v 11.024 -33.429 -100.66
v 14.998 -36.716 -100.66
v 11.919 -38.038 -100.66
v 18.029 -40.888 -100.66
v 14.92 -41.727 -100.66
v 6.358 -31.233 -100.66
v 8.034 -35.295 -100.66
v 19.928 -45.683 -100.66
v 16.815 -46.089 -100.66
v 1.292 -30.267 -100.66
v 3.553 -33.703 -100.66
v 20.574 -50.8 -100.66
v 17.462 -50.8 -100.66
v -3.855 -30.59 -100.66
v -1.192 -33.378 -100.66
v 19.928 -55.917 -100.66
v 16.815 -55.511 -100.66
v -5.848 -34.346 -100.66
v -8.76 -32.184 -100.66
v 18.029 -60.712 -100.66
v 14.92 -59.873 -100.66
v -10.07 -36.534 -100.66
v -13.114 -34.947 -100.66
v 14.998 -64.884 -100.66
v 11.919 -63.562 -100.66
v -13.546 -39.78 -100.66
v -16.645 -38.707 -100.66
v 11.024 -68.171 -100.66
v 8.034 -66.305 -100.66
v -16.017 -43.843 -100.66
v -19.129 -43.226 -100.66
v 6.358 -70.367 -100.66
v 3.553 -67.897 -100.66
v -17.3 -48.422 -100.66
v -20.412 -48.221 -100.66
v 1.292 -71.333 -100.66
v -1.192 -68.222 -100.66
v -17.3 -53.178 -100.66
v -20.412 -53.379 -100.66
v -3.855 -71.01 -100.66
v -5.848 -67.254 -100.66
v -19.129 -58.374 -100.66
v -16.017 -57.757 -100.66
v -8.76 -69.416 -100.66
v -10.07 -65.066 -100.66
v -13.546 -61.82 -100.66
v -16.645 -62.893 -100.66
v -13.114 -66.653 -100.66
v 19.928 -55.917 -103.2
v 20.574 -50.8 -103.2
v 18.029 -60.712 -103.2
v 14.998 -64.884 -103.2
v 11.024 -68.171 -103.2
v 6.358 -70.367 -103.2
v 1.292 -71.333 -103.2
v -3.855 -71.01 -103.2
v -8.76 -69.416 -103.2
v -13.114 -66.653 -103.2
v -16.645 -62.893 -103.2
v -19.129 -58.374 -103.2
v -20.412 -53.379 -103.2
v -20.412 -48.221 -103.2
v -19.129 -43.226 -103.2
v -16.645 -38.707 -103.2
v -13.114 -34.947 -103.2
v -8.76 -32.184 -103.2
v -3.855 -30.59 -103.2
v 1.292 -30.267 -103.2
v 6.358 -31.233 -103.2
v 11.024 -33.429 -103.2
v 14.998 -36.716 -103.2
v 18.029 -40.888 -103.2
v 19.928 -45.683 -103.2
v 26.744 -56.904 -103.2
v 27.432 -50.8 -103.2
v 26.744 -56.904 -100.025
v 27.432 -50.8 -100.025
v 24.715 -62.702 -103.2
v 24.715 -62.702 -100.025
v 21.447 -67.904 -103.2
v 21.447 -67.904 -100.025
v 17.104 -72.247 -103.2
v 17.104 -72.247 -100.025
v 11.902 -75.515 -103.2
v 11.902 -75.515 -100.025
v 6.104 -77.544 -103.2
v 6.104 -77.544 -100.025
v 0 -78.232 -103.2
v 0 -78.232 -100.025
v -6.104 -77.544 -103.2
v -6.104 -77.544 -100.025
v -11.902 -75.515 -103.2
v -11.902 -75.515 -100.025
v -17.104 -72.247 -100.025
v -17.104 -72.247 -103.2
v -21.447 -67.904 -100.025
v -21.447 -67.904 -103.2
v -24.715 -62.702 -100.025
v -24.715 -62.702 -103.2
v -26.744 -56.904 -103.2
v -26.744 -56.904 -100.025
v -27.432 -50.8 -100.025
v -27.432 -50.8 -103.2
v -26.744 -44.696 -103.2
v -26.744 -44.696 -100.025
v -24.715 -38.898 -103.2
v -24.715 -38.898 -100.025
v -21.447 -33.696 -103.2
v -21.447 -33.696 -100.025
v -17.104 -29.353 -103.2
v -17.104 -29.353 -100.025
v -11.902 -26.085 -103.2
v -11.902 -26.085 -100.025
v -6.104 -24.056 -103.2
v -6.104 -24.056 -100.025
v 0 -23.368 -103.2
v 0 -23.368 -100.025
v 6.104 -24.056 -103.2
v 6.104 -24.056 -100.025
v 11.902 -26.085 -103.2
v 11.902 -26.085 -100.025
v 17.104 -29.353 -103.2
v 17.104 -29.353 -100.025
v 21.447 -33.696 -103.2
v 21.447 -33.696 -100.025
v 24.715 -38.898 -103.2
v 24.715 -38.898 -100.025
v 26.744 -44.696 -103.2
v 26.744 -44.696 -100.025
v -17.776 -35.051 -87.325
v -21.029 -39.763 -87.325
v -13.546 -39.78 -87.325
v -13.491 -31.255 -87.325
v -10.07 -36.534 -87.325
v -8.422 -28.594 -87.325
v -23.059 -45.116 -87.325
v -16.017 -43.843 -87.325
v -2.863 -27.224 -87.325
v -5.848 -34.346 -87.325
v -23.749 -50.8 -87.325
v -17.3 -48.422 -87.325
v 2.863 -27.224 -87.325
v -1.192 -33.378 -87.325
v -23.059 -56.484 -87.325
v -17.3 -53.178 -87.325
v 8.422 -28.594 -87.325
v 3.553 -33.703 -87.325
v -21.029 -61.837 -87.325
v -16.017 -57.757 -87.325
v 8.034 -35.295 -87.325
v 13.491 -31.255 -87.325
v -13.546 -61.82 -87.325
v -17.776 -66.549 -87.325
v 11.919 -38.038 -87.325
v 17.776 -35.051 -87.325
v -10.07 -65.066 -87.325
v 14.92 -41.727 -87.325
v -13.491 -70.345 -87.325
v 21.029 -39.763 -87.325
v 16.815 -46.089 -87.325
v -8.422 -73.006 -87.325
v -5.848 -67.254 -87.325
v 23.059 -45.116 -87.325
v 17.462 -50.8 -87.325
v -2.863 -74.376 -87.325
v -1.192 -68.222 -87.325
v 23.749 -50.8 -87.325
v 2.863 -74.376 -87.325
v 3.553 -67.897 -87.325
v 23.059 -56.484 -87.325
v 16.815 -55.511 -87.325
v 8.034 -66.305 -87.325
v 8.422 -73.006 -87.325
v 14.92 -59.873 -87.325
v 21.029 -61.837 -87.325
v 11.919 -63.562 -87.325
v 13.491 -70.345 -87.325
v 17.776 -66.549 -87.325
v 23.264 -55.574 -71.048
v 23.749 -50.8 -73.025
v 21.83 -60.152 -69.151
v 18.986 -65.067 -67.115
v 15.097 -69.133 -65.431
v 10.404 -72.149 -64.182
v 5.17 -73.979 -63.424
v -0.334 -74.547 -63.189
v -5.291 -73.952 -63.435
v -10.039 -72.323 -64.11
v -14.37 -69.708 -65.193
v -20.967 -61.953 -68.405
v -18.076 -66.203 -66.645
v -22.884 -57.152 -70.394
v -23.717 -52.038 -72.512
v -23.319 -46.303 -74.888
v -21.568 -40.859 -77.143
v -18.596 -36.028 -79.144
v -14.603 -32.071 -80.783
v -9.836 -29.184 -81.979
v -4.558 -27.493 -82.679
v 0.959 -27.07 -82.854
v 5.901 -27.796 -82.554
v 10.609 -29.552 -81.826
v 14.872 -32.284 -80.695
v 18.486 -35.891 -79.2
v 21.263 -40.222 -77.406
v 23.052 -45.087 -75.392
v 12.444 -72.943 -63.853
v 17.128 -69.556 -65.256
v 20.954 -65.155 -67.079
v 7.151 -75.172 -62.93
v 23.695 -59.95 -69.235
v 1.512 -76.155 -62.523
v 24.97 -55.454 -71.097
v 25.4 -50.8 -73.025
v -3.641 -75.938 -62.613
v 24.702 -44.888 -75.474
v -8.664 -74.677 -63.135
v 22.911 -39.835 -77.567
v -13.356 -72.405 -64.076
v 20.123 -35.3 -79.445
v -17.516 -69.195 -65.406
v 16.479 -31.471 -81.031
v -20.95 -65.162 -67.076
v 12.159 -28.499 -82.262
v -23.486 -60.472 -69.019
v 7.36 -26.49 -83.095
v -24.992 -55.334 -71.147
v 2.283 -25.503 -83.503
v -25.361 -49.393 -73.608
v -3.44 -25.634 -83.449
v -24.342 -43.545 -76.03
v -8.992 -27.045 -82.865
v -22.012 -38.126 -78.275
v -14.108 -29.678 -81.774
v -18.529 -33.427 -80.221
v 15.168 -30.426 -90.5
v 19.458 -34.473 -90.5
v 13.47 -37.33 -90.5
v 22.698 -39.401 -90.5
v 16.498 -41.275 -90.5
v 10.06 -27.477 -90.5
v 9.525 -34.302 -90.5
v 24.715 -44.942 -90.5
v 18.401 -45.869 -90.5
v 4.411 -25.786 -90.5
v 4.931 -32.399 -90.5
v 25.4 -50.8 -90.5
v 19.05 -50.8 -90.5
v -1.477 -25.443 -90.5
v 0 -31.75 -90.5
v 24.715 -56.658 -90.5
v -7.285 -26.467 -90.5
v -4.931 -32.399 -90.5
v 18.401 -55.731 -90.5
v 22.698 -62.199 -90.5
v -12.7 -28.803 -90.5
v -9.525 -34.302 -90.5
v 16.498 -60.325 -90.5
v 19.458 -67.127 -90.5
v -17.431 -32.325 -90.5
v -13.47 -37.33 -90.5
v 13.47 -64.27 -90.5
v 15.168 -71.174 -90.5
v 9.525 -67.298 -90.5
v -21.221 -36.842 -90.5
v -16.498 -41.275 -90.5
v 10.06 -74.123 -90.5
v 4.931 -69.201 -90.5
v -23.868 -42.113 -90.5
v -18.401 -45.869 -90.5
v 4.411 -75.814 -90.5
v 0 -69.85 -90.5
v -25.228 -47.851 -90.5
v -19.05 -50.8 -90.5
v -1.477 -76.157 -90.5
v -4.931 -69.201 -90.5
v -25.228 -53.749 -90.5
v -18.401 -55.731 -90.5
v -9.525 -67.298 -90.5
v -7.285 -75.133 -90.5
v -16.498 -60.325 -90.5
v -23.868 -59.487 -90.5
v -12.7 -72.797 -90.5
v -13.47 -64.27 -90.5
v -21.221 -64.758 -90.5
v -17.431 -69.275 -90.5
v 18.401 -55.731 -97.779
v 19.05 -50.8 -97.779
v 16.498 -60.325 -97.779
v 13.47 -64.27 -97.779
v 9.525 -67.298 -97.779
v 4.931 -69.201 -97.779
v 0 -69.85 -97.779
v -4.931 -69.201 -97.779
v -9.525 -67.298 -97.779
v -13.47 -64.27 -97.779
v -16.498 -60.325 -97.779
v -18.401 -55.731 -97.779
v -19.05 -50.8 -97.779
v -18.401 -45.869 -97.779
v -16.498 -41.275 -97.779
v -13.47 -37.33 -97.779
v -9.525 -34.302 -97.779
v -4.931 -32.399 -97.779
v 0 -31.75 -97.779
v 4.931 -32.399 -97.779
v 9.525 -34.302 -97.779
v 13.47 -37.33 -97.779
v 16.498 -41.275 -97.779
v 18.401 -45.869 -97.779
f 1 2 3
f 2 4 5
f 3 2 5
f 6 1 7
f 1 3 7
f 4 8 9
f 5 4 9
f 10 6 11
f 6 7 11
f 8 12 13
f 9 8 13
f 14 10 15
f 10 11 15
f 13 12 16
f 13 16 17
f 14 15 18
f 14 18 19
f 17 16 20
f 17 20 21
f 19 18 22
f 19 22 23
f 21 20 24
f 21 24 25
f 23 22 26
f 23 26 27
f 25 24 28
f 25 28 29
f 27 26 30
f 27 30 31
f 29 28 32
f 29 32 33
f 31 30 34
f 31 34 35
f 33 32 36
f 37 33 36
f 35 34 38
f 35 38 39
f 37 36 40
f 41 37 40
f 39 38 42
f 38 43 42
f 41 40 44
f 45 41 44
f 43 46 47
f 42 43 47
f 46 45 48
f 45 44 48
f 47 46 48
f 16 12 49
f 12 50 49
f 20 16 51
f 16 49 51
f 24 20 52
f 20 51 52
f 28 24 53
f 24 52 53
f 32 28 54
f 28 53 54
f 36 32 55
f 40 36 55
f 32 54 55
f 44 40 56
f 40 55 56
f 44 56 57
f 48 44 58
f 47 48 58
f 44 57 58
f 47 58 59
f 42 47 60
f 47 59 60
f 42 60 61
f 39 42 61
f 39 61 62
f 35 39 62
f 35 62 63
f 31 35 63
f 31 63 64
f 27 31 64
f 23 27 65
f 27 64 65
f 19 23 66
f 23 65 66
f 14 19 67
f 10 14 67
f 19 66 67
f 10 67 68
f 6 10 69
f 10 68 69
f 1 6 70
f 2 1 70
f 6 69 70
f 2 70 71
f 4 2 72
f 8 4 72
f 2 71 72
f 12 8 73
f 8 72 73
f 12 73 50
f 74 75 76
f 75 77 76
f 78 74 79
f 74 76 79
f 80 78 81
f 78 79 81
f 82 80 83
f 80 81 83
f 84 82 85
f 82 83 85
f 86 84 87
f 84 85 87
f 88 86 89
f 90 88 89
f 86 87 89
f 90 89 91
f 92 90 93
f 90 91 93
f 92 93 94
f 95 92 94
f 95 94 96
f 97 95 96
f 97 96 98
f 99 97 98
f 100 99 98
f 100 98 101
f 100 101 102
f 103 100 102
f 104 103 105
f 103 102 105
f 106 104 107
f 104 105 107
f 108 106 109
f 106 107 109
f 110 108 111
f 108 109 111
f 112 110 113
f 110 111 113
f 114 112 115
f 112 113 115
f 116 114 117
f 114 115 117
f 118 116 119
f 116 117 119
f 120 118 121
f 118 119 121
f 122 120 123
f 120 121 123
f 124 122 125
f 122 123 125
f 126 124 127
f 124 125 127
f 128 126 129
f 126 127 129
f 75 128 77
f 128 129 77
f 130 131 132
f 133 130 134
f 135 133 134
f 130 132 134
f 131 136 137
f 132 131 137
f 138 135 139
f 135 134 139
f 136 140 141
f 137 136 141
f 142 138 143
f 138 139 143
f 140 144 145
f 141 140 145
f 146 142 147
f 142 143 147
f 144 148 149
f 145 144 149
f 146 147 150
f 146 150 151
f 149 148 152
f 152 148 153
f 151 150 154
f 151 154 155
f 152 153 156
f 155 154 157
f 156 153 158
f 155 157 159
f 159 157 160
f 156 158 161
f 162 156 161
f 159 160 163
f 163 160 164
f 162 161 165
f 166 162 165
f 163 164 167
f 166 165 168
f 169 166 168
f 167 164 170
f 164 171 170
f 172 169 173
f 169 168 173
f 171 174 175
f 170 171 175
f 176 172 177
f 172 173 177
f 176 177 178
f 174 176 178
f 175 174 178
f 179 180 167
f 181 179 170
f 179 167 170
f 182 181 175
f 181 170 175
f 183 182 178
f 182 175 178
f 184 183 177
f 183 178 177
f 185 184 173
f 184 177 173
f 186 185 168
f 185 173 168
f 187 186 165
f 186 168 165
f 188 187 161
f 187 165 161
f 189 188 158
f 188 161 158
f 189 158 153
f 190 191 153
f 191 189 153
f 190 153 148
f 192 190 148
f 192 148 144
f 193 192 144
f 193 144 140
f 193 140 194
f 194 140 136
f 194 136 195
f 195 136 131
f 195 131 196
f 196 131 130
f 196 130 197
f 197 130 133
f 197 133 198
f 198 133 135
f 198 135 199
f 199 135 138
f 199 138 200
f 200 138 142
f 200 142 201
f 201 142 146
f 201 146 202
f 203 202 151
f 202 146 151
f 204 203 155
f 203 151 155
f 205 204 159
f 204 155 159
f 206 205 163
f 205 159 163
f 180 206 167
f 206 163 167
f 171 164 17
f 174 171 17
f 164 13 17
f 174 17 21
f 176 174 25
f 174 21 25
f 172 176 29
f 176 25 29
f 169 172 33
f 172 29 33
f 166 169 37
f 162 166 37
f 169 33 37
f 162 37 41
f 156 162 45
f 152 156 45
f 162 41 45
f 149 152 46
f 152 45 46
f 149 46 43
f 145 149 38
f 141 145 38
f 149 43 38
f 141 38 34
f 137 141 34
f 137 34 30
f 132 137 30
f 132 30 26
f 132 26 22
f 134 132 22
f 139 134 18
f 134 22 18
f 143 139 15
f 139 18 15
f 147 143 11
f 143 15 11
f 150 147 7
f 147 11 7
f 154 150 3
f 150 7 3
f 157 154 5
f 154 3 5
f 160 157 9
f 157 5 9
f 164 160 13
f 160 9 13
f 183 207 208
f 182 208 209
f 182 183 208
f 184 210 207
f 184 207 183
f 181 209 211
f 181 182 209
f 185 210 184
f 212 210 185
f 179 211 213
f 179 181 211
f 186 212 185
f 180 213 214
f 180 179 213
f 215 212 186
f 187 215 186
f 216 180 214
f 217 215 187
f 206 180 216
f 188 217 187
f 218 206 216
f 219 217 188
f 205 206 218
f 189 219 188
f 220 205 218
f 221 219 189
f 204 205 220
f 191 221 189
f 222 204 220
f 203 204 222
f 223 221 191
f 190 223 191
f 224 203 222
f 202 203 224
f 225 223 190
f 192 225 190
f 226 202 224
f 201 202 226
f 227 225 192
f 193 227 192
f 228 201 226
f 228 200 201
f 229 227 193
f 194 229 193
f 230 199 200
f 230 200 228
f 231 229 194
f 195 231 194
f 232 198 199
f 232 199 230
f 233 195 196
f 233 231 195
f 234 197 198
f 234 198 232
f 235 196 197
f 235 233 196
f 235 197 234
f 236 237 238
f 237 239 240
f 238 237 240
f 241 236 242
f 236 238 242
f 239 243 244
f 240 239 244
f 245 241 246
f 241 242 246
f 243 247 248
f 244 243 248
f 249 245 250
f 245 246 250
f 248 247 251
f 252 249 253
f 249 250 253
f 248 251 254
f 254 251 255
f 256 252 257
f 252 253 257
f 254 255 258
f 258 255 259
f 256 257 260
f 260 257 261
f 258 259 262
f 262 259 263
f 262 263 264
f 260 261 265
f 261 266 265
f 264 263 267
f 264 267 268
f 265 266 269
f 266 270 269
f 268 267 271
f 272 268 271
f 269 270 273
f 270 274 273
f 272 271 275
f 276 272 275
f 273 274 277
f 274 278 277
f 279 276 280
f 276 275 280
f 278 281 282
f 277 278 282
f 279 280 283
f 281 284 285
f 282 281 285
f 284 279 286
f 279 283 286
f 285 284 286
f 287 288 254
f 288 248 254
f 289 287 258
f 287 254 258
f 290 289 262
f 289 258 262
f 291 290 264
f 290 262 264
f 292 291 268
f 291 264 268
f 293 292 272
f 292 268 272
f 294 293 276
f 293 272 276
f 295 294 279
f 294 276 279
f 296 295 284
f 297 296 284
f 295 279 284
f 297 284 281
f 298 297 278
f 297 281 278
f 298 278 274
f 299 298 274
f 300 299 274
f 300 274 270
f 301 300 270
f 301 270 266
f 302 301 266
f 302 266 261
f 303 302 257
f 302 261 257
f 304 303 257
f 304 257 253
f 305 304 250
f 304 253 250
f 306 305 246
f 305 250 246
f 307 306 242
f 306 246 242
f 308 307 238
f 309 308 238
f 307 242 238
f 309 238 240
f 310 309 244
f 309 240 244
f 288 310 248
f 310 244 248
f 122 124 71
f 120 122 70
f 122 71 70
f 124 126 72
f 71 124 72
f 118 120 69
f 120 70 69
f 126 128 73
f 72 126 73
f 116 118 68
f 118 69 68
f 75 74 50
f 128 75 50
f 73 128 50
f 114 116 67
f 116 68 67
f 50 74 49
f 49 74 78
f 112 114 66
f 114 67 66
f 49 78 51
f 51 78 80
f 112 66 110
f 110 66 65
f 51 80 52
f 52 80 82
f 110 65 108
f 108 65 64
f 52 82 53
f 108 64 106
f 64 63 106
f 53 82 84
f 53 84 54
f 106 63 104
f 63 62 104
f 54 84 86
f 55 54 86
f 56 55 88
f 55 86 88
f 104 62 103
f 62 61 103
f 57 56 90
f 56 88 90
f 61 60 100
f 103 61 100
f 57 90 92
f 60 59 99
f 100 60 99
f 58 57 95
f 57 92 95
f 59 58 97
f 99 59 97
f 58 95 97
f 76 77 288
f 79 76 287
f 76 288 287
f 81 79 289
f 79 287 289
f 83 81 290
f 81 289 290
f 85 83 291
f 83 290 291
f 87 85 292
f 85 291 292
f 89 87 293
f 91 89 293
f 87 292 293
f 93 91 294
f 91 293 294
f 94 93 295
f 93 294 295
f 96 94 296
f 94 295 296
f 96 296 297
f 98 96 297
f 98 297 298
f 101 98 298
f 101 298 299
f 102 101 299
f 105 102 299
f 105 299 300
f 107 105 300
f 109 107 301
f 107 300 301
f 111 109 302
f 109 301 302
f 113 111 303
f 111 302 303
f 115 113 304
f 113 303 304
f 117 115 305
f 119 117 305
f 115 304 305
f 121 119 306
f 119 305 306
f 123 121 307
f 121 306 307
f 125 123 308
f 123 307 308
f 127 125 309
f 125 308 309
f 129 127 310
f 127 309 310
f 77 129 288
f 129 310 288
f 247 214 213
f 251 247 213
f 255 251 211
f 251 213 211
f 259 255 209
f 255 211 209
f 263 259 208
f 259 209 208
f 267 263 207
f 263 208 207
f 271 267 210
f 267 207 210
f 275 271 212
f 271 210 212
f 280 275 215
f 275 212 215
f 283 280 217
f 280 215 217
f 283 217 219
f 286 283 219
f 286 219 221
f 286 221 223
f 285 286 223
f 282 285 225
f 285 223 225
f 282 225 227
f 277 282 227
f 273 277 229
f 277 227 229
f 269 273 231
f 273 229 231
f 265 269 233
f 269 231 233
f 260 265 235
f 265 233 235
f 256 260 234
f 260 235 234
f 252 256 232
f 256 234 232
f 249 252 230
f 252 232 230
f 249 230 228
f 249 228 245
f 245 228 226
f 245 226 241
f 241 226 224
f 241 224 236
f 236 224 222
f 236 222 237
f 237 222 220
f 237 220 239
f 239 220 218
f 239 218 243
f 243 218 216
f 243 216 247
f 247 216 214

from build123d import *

# Parameters (mm, degrees)
CUT_EXTRUDE1_DEPTH      = 133.374626451
CUT_EXTRUDE1_DEPTH_BACK = 133.374626451


with BuildPart() as part:
    # Sketch4 → Revolve2 (revolve)
    with BuildSketch(Plane(origin=(0, 0, 0), x_dir=(0, 0, -1), z_dir=(1, 0, 0))):
        Polygon((87.3252, -33.3375), (100.6602, -33.3375), (100.6602, -30.226), (103.2002, -30.226), (103.2002, -23.368), (100.0252, -23.368), (97.779249869, -31.75), (90.5002, -31.75), (90.5002, -25.4), (58.7502, -25.4), (58.7502, -27.051), (87.3252, -27.051), align=None)
    revolve(axis=Axis((0, -50.8, -87.3252), (0, 0, -1)))

    # Sketch10 → Cut-Extrude1 (cut, two sides: drawn at the far end of the back side and taken through both)
    with BuildSketch(Plane(origin=(0, 0, 0), x_dir=(0, 0, -1), z_dir=(1, 0, 0)).offset(-CUT_EXTRUDE1_DEPTH_BACK)):
        Polygon((57.499707015, -88.281372884), (88.550292985, -13.318627116), (35.383859736, -13.318627116), (35.383859736, -88.281372884), align=None)
    extrude(amount=CUT_EXTRUDE1_DEPTH + CUT_EXTRUDE1_DEPTH_BACK, mode=Mode.SUBTRACT)


solid = part.part
